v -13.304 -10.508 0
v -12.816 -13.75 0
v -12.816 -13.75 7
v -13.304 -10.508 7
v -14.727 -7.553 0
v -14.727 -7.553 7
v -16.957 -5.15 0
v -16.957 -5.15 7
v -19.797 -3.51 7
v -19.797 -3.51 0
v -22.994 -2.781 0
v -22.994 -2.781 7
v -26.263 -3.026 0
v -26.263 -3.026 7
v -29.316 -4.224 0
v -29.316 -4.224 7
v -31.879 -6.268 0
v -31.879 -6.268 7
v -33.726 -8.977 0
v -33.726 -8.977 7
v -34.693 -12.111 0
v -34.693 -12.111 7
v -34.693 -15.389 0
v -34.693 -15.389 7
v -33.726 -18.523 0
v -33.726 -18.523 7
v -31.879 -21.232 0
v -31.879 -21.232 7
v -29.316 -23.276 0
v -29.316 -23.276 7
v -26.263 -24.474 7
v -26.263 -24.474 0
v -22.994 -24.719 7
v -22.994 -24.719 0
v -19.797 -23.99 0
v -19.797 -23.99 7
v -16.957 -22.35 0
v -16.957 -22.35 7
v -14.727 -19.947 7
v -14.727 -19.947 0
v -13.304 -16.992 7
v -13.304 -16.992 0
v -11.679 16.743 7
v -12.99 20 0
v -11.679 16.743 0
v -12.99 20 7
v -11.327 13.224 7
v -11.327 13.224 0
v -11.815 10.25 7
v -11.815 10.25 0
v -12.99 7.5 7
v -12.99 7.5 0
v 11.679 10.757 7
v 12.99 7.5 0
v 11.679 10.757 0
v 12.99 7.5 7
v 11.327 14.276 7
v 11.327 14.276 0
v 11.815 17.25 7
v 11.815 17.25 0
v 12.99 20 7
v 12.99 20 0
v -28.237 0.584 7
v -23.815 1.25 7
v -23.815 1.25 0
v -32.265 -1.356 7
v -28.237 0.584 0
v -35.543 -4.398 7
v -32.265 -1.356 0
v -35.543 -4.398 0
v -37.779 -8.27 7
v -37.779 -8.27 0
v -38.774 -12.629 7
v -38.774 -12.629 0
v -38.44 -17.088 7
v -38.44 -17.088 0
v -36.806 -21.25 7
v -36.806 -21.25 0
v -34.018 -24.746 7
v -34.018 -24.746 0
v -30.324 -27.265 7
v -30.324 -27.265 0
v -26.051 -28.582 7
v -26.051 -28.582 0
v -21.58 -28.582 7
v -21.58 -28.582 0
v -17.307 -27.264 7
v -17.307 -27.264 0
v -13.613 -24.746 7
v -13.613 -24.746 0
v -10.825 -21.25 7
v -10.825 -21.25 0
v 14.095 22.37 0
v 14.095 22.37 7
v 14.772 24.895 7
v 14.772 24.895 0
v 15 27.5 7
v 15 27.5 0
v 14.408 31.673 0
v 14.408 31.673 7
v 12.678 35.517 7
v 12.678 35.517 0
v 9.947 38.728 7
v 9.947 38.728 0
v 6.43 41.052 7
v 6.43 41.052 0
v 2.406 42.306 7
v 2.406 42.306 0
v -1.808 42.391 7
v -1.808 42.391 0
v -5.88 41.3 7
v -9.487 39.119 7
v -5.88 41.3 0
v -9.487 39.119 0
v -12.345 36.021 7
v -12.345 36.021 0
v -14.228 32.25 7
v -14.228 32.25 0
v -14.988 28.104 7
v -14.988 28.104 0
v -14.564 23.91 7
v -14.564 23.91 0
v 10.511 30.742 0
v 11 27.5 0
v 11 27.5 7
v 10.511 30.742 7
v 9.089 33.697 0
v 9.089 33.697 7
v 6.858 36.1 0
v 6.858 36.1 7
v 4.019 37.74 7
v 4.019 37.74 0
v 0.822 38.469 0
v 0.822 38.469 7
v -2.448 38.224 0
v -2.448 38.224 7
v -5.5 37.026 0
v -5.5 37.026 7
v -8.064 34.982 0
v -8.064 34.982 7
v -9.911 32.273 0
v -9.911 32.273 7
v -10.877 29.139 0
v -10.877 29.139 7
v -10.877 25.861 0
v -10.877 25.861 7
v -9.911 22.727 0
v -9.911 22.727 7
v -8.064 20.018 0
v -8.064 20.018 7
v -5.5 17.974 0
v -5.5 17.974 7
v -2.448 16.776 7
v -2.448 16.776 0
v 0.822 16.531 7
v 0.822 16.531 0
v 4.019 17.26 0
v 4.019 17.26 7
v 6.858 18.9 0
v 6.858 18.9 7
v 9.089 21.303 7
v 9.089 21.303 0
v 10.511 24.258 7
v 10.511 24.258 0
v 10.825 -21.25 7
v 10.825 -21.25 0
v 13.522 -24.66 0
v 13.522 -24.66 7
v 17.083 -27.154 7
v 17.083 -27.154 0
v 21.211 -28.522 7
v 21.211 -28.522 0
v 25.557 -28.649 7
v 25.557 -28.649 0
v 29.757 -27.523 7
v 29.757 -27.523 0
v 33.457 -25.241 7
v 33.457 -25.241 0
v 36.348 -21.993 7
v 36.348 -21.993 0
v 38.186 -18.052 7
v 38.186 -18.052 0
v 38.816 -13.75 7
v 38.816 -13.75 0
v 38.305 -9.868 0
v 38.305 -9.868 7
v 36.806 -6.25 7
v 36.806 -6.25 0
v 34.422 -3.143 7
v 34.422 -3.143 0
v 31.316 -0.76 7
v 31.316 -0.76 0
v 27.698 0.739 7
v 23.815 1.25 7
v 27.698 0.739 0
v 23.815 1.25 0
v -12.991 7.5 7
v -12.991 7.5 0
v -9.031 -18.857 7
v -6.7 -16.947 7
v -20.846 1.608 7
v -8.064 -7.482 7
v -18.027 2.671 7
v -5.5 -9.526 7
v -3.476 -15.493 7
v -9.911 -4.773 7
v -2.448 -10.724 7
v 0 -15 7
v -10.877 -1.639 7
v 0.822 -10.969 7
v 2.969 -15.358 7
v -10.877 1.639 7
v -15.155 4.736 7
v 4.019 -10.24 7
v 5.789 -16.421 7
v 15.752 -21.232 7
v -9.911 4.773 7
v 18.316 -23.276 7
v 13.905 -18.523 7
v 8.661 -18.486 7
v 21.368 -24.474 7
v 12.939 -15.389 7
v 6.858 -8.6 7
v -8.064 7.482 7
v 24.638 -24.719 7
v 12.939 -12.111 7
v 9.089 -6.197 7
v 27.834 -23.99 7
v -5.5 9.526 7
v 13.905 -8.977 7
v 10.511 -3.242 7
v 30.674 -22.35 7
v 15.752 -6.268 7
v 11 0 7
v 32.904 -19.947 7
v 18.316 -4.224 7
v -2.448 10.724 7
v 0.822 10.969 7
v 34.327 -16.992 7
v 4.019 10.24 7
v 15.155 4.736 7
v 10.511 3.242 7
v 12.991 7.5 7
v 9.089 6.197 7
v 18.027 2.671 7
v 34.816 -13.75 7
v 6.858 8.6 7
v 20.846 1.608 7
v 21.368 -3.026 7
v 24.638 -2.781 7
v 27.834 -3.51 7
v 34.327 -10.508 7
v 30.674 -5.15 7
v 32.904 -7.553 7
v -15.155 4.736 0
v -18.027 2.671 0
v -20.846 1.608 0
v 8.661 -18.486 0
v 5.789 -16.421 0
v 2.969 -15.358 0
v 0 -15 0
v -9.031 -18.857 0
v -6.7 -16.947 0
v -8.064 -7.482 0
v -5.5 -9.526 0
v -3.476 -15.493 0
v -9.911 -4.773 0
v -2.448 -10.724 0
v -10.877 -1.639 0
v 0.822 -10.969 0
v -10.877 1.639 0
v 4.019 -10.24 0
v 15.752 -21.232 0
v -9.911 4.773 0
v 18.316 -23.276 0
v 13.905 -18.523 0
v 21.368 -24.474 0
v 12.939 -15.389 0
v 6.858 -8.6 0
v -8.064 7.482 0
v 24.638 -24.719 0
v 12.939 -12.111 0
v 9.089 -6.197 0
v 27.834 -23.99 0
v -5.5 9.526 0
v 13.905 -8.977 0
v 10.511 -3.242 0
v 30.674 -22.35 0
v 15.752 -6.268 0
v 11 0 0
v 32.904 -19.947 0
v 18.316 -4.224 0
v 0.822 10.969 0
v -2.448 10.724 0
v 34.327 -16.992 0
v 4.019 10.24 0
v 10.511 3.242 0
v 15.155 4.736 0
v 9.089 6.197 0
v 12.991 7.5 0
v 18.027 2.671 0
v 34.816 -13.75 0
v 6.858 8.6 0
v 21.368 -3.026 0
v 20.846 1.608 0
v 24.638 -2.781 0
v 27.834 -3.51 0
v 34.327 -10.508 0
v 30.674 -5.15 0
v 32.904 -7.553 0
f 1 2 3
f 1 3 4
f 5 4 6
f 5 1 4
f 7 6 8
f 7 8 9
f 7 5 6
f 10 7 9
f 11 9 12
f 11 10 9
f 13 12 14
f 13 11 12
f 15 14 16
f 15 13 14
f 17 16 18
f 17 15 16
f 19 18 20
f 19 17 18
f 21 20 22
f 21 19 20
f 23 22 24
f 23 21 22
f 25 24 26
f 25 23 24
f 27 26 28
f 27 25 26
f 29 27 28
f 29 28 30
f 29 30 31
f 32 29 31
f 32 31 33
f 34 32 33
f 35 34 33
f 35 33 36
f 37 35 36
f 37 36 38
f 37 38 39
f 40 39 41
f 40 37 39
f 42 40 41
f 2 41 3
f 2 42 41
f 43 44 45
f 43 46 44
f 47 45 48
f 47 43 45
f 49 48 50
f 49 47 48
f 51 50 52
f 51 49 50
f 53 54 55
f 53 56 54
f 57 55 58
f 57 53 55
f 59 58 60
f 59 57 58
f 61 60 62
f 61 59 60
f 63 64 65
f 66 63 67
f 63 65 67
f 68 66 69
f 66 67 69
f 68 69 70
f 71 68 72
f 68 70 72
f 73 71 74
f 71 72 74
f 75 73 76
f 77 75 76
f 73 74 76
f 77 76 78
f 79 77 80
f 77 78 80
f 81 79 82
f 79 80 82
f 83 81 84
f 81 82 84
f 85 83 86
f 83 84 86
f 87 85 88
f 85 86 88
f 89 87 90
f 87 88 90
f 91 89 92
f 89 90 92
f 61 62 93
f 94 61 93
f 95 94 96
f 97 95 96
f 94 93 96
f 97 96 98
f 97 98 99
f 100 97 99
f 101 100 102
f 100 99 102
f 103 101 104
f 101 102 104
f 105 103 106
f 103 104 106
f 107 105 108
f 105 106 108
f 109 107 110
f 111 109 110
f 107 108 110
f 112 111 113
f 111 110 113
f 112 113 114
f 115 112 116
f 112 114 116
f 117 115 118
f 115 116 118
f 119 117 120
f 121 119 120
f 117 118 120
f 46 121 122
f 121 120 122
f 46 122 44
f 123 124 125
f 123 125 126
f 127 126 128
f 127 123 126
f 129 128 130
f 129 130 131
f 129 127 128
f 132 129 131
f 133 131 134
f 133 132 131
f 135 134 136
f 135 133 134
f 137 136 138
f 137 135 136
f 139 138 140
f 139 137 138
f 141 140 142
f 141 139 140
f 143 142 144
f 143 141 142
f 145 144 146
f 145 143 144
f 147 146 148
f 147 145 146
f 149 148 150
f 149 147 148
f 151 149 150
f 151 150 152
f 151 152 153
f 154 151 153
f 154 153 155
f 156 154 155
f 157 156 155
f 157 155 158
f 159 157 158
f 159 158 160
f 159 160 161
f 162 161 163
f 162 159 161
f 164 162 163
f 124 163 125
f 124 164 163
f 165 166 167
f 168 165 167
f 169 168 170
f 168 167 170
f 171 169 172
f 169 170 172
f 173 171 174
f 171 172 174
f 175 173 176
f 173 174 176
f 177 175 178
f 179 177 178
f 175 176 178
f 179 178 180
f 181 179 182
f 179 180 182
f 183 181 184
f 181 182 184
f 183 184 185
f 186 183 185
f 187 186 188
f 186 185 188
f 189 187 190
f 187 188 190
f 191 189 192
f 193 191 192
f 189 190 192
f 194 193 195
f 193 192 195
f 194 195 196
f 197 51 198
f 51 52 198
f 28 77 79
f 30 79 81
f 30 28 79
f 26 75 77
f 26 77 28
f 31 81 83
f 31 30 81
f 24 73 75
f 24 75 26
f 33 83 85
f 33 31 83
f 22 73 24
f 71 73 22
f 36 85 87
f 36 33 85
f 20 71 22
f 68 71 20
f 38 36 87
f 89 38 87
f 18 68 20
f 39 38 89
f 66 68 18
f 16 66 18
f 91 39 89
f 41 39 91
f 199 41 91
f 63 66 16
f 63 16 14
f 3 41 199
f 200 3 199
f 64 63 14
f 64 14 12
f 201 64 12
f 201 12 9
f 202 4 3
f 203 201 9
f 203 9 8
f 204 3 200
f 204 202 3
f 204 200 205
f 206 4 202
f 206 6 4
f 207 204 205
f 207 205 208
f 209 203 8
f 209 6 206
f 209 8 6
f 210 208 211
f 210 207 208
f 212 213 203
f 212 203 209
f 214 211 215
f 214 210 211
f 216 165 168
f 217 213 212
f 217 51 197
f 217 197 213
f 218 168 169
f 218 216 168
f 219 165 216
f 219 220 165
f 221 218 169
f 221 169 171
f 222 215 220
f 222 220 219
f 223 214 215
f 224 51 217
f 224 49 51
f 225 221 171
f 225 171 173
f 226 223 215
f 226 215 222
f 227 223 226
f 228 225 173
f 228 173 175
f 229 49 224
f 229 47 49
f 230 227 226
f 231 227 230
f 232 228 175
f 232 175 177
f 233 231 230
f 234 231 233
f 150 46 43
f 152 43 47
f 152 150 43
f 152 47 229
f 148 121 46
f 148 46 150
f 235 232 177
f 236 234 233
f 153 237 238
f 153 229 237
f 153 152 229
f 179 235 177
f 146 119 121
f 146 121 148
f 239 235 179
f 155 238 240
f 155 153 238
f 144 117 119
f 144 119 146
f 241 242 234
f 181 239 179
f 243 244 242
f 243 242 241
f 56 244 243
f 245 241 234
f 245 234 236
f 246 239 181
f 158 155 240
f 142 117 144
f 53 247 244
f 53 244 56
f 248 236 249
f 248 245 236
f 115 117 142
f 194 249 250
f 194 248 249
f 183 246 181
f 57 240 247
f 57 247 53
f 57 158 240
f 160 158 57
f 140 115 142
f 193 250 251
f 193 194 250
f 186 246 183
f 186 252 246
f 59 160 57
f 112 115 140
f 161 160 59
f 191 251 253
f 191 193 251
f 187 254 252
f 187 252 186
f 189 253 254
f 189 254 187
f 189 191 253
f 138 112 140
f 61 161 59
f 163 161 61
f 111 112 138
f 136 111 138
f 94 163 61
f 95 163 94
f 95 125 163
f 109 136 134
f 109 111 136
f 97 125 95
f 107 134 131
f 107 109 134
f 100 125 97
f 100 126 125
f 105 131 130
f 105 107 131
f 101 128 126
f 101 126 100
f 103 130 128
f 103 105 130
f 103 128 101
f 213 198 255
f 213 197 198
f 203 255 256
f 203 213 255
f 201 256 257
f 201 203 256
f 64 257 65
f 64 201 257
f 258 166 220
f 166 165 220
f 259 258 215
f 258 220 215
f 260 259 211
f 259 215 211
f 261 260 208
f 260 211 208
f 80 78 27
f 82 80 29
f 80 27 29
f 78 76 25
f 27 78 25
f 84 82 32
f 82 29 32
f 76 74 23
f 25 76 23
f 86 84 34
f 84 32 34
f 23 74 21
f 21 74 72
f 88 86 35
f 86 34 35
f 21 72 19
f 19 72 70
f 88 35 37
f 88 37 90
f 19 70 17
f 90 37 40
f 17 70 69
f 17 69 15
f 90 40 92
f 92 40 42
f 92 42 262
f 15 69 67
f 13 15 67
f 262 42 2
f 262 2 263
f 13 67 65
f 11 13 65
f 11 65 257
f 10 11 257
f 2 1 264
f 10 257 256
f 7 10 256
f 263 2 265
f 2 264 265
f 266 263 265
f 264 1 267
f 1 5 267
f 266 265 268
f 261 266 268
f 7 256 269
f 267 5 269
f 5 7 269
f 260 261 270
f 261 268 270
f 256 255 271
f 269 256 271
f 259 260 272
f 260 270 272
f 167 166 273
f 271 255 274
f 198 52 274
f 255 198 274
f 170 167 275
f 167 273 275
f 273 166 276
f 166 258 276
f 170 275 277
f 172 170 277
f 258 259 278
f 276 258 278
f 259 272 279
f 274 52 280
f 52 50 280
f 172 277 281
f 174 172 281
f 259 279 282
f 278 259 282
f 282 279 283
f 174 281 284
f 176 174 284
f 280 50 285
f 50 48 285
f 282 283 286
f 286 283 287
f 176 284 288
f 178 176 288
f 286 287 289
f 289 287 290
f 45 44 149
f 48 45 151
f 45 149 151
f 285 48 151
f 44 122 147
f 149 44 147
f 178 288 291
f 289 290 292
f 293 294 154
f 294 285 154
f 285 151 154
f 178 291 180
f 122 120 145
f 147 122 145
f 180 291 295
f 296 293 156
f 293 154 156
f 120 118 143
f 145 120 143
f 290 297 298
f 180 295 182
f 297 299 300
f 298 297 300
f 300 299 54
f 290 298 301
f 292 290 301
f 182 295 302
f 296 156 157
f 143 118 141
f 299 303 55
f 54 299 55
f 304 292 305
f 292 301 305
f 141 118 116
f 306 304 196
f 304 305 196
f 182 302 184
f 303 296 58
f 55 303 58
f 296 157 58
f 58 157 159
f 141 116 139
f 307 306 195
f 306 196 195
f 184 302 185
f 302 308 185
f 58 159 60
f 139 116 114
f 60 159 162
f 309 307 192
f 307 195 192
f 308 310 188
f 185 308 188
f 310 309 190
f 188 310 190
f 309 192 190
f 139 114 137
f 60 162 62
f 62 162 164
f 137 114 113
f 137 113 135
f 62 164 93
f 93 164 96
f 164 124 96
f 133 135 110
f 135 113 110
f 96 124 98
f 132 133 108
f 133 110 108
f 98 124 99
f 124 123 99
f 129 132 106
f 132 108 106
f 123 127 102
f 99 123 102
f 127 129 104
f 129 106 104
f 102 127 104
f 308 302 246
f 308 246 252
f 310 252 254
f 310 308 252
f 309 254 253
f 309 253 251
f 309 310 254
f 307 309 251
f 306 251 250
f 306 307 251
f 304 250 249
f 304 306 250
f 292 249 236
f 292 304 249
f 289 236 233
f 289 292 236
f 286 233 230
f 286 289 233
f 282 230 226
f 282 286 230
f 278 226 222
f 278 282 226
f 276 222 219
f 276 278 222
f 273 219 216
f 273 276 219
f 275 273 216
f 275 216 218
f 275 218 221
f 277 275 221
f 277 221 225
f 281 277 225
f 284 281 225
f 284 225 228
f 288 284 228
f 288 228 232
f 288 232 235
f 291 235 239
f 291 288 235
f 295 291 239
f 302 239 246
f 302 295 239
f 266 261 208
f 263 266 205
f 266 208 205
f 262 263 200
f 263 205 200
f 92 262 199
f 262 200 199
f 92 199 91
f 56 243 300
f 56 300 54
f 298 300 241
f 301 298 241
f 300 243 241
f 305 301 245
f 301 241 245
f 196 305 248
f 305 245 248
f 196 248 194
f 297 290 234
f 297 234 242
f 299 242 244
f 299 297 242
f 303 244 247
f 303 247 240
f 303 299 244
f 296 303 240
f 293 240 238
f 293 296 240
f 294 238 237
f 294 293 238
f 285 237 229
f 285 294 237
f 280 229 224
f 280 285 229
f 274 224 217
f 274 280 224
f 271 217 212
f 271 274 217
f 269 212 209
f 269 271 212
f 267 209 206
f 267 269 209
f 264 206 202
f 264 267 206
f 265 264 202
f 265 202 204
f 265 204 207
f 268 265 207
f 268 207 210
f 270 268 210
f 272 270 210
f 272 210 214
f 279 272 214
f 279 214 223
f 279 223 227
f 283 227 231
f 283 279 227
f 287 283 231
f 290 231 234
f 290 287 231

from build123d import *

# Parameters (mm, degrees)
F0_R     = 11
F1_DEPTH = 7
F2_R     = 12.499


# Not quite as in the source:
# - a fillet or chamfer is up to 0.001 mm smaller than in the source, because OpenCascade refuses the exact size


with BuildPart() as f1:
    # F0 (on Top) → F1 (new body)
    with BuildSketch(Plane.XY):
        with BuildLine():
            ThreePointArc((14.9052440041, -1.6833600857), (14.9762922658, -0.8430124372), (15, 0))
            ThreePointArc((15, 0), (12.5483433381, 8.2182163192), (5.9947894041, 13.75))
            ThreePointArc((5.9947894041, 13.75), (0, 12.5), (-5.9947894041, 13.75))
            ThreePointArc((-5.9947894041, 13.75), (-12.9903810568, 7.5), (-14.9052440041, -1.6833600857))
            ThreePointArc((-14.9052440041, -1.6833600857), (-10.8253175473, -6.25), (-8.9104546, -12.0666399143))
            ThreePointArc((-8.9104546, -12.0666399143), (0, -15), (8.9104546, -12.0666399143))
            ThreePointArc((8.9104546, -12.0666399143), (10.8253175473, -6.25), (14.9052440041, -1.6833600857))
        make_face()
        Circle(F0_R, mode=Mode.SUBTRACT)
        with BuildLine():
            ThreePointArc((-5.9947894041, 13.75), (0, 12.5), (5.9947894041, 13.75))
            ThreePointArc((5.9947894041, 13.75), (0, 15), (-5.9947894041, 13.75))
        make_face()
        with BuildLine():
            ThreePointArc((-5.9947894041, 13.75), (0, 15), (5.9947894041, 13.75))
            ThreePointArc((5.9947894041, 13.75), (12.5483433381, 19.2817836808), (15, 27.5))
            ThreePointArc((15, 27.5), (-8.2182163192, 40.0483433381), (-5.9947894041, 13.75))
        make_face()
        with Locations((0, 27.5)):
            Circle(F0_R, mode=Mode.SUBTRACT)
        with BuildLine():
            ThreePointArc((38.8156986041, -13.75), (30.5737745507, -0.3586442247), (14.9052440041, -1.6833600857))
            ThreePointArc((14.9052440041, -1.6833600857), (12.9903810568, -7.5), (8.9104546, -12.0666399143))
            ThreePointArc((8.9104546, -12.0666399143), (22.9726861669, -28.7262922658), (38.8156986041, -13.75))
        make_face()
        with Locations((23.8156986041, -13.75)):
            Circle(F0_R, mode=Mode.SUBTRACT)
        with BuildLine():
            ThreePointArc((8.9104546, -12.0666399143), (12.9903810568, -7.5), (14.9052440041, -1.6833600857))
            ThreePointArc((14.9052440041, -1.6833600857), (10.8253175473, -6.25), (8.9104546, -12.0666399143))
        make_face()
        with BuildLine():
            ThreePointArc((-8.9104546, -12.0666399143), (-10.8253175473, -6.25), (-14.9052440041, -1.6833600857))
            ThreePointArc((-14.9052440041, -1.6833600857), (-12.9903810568, -7.5), (-8.9104546, -12.0666399143))
        make_face()
        with BuildLine():
            ThreePointArc((-8.9104546, -12.0666399143), (-12.9903810568, -7.5), (-14.9052440041, -1.6833600857))
            ThreePointArc((-14.9052440041, -1.6833600857), (-37.2070543793, -20.5080759466), (-8.8156986041, -13.75))
            ThreePointArc((-8.8156986041, -13.75), (-8.8394063383, -12.9069875628), (-8.9104546, -12.0666399143))
        make_face()
        with Locations((-23.8156986041, -13.75)):
            Circle(F0_R, mode=Mode.SUBTRACT)
    extrude(amount=F1_DEPTH)

    # F2 (radius 12.5 in the source; OpenCascade refuses exactly that, so slightly less here)
    f2_edges = [f1.edges().sort_by_distance(p)[0] for p in [
        (-5.994789, 13.75, 3.5),
        (14.905244, -1.68336, 3.5),
        (-14.905244, -1.68336, 3.5),
        (5.994789, 13.75, 3.5),
        (-8.910455, -12.06664, 3.5),
        (8.910455, -12.06664, 3.5),
    ]]
    fillet(f2_edges, radius=F2_R)


solid = f1.part
